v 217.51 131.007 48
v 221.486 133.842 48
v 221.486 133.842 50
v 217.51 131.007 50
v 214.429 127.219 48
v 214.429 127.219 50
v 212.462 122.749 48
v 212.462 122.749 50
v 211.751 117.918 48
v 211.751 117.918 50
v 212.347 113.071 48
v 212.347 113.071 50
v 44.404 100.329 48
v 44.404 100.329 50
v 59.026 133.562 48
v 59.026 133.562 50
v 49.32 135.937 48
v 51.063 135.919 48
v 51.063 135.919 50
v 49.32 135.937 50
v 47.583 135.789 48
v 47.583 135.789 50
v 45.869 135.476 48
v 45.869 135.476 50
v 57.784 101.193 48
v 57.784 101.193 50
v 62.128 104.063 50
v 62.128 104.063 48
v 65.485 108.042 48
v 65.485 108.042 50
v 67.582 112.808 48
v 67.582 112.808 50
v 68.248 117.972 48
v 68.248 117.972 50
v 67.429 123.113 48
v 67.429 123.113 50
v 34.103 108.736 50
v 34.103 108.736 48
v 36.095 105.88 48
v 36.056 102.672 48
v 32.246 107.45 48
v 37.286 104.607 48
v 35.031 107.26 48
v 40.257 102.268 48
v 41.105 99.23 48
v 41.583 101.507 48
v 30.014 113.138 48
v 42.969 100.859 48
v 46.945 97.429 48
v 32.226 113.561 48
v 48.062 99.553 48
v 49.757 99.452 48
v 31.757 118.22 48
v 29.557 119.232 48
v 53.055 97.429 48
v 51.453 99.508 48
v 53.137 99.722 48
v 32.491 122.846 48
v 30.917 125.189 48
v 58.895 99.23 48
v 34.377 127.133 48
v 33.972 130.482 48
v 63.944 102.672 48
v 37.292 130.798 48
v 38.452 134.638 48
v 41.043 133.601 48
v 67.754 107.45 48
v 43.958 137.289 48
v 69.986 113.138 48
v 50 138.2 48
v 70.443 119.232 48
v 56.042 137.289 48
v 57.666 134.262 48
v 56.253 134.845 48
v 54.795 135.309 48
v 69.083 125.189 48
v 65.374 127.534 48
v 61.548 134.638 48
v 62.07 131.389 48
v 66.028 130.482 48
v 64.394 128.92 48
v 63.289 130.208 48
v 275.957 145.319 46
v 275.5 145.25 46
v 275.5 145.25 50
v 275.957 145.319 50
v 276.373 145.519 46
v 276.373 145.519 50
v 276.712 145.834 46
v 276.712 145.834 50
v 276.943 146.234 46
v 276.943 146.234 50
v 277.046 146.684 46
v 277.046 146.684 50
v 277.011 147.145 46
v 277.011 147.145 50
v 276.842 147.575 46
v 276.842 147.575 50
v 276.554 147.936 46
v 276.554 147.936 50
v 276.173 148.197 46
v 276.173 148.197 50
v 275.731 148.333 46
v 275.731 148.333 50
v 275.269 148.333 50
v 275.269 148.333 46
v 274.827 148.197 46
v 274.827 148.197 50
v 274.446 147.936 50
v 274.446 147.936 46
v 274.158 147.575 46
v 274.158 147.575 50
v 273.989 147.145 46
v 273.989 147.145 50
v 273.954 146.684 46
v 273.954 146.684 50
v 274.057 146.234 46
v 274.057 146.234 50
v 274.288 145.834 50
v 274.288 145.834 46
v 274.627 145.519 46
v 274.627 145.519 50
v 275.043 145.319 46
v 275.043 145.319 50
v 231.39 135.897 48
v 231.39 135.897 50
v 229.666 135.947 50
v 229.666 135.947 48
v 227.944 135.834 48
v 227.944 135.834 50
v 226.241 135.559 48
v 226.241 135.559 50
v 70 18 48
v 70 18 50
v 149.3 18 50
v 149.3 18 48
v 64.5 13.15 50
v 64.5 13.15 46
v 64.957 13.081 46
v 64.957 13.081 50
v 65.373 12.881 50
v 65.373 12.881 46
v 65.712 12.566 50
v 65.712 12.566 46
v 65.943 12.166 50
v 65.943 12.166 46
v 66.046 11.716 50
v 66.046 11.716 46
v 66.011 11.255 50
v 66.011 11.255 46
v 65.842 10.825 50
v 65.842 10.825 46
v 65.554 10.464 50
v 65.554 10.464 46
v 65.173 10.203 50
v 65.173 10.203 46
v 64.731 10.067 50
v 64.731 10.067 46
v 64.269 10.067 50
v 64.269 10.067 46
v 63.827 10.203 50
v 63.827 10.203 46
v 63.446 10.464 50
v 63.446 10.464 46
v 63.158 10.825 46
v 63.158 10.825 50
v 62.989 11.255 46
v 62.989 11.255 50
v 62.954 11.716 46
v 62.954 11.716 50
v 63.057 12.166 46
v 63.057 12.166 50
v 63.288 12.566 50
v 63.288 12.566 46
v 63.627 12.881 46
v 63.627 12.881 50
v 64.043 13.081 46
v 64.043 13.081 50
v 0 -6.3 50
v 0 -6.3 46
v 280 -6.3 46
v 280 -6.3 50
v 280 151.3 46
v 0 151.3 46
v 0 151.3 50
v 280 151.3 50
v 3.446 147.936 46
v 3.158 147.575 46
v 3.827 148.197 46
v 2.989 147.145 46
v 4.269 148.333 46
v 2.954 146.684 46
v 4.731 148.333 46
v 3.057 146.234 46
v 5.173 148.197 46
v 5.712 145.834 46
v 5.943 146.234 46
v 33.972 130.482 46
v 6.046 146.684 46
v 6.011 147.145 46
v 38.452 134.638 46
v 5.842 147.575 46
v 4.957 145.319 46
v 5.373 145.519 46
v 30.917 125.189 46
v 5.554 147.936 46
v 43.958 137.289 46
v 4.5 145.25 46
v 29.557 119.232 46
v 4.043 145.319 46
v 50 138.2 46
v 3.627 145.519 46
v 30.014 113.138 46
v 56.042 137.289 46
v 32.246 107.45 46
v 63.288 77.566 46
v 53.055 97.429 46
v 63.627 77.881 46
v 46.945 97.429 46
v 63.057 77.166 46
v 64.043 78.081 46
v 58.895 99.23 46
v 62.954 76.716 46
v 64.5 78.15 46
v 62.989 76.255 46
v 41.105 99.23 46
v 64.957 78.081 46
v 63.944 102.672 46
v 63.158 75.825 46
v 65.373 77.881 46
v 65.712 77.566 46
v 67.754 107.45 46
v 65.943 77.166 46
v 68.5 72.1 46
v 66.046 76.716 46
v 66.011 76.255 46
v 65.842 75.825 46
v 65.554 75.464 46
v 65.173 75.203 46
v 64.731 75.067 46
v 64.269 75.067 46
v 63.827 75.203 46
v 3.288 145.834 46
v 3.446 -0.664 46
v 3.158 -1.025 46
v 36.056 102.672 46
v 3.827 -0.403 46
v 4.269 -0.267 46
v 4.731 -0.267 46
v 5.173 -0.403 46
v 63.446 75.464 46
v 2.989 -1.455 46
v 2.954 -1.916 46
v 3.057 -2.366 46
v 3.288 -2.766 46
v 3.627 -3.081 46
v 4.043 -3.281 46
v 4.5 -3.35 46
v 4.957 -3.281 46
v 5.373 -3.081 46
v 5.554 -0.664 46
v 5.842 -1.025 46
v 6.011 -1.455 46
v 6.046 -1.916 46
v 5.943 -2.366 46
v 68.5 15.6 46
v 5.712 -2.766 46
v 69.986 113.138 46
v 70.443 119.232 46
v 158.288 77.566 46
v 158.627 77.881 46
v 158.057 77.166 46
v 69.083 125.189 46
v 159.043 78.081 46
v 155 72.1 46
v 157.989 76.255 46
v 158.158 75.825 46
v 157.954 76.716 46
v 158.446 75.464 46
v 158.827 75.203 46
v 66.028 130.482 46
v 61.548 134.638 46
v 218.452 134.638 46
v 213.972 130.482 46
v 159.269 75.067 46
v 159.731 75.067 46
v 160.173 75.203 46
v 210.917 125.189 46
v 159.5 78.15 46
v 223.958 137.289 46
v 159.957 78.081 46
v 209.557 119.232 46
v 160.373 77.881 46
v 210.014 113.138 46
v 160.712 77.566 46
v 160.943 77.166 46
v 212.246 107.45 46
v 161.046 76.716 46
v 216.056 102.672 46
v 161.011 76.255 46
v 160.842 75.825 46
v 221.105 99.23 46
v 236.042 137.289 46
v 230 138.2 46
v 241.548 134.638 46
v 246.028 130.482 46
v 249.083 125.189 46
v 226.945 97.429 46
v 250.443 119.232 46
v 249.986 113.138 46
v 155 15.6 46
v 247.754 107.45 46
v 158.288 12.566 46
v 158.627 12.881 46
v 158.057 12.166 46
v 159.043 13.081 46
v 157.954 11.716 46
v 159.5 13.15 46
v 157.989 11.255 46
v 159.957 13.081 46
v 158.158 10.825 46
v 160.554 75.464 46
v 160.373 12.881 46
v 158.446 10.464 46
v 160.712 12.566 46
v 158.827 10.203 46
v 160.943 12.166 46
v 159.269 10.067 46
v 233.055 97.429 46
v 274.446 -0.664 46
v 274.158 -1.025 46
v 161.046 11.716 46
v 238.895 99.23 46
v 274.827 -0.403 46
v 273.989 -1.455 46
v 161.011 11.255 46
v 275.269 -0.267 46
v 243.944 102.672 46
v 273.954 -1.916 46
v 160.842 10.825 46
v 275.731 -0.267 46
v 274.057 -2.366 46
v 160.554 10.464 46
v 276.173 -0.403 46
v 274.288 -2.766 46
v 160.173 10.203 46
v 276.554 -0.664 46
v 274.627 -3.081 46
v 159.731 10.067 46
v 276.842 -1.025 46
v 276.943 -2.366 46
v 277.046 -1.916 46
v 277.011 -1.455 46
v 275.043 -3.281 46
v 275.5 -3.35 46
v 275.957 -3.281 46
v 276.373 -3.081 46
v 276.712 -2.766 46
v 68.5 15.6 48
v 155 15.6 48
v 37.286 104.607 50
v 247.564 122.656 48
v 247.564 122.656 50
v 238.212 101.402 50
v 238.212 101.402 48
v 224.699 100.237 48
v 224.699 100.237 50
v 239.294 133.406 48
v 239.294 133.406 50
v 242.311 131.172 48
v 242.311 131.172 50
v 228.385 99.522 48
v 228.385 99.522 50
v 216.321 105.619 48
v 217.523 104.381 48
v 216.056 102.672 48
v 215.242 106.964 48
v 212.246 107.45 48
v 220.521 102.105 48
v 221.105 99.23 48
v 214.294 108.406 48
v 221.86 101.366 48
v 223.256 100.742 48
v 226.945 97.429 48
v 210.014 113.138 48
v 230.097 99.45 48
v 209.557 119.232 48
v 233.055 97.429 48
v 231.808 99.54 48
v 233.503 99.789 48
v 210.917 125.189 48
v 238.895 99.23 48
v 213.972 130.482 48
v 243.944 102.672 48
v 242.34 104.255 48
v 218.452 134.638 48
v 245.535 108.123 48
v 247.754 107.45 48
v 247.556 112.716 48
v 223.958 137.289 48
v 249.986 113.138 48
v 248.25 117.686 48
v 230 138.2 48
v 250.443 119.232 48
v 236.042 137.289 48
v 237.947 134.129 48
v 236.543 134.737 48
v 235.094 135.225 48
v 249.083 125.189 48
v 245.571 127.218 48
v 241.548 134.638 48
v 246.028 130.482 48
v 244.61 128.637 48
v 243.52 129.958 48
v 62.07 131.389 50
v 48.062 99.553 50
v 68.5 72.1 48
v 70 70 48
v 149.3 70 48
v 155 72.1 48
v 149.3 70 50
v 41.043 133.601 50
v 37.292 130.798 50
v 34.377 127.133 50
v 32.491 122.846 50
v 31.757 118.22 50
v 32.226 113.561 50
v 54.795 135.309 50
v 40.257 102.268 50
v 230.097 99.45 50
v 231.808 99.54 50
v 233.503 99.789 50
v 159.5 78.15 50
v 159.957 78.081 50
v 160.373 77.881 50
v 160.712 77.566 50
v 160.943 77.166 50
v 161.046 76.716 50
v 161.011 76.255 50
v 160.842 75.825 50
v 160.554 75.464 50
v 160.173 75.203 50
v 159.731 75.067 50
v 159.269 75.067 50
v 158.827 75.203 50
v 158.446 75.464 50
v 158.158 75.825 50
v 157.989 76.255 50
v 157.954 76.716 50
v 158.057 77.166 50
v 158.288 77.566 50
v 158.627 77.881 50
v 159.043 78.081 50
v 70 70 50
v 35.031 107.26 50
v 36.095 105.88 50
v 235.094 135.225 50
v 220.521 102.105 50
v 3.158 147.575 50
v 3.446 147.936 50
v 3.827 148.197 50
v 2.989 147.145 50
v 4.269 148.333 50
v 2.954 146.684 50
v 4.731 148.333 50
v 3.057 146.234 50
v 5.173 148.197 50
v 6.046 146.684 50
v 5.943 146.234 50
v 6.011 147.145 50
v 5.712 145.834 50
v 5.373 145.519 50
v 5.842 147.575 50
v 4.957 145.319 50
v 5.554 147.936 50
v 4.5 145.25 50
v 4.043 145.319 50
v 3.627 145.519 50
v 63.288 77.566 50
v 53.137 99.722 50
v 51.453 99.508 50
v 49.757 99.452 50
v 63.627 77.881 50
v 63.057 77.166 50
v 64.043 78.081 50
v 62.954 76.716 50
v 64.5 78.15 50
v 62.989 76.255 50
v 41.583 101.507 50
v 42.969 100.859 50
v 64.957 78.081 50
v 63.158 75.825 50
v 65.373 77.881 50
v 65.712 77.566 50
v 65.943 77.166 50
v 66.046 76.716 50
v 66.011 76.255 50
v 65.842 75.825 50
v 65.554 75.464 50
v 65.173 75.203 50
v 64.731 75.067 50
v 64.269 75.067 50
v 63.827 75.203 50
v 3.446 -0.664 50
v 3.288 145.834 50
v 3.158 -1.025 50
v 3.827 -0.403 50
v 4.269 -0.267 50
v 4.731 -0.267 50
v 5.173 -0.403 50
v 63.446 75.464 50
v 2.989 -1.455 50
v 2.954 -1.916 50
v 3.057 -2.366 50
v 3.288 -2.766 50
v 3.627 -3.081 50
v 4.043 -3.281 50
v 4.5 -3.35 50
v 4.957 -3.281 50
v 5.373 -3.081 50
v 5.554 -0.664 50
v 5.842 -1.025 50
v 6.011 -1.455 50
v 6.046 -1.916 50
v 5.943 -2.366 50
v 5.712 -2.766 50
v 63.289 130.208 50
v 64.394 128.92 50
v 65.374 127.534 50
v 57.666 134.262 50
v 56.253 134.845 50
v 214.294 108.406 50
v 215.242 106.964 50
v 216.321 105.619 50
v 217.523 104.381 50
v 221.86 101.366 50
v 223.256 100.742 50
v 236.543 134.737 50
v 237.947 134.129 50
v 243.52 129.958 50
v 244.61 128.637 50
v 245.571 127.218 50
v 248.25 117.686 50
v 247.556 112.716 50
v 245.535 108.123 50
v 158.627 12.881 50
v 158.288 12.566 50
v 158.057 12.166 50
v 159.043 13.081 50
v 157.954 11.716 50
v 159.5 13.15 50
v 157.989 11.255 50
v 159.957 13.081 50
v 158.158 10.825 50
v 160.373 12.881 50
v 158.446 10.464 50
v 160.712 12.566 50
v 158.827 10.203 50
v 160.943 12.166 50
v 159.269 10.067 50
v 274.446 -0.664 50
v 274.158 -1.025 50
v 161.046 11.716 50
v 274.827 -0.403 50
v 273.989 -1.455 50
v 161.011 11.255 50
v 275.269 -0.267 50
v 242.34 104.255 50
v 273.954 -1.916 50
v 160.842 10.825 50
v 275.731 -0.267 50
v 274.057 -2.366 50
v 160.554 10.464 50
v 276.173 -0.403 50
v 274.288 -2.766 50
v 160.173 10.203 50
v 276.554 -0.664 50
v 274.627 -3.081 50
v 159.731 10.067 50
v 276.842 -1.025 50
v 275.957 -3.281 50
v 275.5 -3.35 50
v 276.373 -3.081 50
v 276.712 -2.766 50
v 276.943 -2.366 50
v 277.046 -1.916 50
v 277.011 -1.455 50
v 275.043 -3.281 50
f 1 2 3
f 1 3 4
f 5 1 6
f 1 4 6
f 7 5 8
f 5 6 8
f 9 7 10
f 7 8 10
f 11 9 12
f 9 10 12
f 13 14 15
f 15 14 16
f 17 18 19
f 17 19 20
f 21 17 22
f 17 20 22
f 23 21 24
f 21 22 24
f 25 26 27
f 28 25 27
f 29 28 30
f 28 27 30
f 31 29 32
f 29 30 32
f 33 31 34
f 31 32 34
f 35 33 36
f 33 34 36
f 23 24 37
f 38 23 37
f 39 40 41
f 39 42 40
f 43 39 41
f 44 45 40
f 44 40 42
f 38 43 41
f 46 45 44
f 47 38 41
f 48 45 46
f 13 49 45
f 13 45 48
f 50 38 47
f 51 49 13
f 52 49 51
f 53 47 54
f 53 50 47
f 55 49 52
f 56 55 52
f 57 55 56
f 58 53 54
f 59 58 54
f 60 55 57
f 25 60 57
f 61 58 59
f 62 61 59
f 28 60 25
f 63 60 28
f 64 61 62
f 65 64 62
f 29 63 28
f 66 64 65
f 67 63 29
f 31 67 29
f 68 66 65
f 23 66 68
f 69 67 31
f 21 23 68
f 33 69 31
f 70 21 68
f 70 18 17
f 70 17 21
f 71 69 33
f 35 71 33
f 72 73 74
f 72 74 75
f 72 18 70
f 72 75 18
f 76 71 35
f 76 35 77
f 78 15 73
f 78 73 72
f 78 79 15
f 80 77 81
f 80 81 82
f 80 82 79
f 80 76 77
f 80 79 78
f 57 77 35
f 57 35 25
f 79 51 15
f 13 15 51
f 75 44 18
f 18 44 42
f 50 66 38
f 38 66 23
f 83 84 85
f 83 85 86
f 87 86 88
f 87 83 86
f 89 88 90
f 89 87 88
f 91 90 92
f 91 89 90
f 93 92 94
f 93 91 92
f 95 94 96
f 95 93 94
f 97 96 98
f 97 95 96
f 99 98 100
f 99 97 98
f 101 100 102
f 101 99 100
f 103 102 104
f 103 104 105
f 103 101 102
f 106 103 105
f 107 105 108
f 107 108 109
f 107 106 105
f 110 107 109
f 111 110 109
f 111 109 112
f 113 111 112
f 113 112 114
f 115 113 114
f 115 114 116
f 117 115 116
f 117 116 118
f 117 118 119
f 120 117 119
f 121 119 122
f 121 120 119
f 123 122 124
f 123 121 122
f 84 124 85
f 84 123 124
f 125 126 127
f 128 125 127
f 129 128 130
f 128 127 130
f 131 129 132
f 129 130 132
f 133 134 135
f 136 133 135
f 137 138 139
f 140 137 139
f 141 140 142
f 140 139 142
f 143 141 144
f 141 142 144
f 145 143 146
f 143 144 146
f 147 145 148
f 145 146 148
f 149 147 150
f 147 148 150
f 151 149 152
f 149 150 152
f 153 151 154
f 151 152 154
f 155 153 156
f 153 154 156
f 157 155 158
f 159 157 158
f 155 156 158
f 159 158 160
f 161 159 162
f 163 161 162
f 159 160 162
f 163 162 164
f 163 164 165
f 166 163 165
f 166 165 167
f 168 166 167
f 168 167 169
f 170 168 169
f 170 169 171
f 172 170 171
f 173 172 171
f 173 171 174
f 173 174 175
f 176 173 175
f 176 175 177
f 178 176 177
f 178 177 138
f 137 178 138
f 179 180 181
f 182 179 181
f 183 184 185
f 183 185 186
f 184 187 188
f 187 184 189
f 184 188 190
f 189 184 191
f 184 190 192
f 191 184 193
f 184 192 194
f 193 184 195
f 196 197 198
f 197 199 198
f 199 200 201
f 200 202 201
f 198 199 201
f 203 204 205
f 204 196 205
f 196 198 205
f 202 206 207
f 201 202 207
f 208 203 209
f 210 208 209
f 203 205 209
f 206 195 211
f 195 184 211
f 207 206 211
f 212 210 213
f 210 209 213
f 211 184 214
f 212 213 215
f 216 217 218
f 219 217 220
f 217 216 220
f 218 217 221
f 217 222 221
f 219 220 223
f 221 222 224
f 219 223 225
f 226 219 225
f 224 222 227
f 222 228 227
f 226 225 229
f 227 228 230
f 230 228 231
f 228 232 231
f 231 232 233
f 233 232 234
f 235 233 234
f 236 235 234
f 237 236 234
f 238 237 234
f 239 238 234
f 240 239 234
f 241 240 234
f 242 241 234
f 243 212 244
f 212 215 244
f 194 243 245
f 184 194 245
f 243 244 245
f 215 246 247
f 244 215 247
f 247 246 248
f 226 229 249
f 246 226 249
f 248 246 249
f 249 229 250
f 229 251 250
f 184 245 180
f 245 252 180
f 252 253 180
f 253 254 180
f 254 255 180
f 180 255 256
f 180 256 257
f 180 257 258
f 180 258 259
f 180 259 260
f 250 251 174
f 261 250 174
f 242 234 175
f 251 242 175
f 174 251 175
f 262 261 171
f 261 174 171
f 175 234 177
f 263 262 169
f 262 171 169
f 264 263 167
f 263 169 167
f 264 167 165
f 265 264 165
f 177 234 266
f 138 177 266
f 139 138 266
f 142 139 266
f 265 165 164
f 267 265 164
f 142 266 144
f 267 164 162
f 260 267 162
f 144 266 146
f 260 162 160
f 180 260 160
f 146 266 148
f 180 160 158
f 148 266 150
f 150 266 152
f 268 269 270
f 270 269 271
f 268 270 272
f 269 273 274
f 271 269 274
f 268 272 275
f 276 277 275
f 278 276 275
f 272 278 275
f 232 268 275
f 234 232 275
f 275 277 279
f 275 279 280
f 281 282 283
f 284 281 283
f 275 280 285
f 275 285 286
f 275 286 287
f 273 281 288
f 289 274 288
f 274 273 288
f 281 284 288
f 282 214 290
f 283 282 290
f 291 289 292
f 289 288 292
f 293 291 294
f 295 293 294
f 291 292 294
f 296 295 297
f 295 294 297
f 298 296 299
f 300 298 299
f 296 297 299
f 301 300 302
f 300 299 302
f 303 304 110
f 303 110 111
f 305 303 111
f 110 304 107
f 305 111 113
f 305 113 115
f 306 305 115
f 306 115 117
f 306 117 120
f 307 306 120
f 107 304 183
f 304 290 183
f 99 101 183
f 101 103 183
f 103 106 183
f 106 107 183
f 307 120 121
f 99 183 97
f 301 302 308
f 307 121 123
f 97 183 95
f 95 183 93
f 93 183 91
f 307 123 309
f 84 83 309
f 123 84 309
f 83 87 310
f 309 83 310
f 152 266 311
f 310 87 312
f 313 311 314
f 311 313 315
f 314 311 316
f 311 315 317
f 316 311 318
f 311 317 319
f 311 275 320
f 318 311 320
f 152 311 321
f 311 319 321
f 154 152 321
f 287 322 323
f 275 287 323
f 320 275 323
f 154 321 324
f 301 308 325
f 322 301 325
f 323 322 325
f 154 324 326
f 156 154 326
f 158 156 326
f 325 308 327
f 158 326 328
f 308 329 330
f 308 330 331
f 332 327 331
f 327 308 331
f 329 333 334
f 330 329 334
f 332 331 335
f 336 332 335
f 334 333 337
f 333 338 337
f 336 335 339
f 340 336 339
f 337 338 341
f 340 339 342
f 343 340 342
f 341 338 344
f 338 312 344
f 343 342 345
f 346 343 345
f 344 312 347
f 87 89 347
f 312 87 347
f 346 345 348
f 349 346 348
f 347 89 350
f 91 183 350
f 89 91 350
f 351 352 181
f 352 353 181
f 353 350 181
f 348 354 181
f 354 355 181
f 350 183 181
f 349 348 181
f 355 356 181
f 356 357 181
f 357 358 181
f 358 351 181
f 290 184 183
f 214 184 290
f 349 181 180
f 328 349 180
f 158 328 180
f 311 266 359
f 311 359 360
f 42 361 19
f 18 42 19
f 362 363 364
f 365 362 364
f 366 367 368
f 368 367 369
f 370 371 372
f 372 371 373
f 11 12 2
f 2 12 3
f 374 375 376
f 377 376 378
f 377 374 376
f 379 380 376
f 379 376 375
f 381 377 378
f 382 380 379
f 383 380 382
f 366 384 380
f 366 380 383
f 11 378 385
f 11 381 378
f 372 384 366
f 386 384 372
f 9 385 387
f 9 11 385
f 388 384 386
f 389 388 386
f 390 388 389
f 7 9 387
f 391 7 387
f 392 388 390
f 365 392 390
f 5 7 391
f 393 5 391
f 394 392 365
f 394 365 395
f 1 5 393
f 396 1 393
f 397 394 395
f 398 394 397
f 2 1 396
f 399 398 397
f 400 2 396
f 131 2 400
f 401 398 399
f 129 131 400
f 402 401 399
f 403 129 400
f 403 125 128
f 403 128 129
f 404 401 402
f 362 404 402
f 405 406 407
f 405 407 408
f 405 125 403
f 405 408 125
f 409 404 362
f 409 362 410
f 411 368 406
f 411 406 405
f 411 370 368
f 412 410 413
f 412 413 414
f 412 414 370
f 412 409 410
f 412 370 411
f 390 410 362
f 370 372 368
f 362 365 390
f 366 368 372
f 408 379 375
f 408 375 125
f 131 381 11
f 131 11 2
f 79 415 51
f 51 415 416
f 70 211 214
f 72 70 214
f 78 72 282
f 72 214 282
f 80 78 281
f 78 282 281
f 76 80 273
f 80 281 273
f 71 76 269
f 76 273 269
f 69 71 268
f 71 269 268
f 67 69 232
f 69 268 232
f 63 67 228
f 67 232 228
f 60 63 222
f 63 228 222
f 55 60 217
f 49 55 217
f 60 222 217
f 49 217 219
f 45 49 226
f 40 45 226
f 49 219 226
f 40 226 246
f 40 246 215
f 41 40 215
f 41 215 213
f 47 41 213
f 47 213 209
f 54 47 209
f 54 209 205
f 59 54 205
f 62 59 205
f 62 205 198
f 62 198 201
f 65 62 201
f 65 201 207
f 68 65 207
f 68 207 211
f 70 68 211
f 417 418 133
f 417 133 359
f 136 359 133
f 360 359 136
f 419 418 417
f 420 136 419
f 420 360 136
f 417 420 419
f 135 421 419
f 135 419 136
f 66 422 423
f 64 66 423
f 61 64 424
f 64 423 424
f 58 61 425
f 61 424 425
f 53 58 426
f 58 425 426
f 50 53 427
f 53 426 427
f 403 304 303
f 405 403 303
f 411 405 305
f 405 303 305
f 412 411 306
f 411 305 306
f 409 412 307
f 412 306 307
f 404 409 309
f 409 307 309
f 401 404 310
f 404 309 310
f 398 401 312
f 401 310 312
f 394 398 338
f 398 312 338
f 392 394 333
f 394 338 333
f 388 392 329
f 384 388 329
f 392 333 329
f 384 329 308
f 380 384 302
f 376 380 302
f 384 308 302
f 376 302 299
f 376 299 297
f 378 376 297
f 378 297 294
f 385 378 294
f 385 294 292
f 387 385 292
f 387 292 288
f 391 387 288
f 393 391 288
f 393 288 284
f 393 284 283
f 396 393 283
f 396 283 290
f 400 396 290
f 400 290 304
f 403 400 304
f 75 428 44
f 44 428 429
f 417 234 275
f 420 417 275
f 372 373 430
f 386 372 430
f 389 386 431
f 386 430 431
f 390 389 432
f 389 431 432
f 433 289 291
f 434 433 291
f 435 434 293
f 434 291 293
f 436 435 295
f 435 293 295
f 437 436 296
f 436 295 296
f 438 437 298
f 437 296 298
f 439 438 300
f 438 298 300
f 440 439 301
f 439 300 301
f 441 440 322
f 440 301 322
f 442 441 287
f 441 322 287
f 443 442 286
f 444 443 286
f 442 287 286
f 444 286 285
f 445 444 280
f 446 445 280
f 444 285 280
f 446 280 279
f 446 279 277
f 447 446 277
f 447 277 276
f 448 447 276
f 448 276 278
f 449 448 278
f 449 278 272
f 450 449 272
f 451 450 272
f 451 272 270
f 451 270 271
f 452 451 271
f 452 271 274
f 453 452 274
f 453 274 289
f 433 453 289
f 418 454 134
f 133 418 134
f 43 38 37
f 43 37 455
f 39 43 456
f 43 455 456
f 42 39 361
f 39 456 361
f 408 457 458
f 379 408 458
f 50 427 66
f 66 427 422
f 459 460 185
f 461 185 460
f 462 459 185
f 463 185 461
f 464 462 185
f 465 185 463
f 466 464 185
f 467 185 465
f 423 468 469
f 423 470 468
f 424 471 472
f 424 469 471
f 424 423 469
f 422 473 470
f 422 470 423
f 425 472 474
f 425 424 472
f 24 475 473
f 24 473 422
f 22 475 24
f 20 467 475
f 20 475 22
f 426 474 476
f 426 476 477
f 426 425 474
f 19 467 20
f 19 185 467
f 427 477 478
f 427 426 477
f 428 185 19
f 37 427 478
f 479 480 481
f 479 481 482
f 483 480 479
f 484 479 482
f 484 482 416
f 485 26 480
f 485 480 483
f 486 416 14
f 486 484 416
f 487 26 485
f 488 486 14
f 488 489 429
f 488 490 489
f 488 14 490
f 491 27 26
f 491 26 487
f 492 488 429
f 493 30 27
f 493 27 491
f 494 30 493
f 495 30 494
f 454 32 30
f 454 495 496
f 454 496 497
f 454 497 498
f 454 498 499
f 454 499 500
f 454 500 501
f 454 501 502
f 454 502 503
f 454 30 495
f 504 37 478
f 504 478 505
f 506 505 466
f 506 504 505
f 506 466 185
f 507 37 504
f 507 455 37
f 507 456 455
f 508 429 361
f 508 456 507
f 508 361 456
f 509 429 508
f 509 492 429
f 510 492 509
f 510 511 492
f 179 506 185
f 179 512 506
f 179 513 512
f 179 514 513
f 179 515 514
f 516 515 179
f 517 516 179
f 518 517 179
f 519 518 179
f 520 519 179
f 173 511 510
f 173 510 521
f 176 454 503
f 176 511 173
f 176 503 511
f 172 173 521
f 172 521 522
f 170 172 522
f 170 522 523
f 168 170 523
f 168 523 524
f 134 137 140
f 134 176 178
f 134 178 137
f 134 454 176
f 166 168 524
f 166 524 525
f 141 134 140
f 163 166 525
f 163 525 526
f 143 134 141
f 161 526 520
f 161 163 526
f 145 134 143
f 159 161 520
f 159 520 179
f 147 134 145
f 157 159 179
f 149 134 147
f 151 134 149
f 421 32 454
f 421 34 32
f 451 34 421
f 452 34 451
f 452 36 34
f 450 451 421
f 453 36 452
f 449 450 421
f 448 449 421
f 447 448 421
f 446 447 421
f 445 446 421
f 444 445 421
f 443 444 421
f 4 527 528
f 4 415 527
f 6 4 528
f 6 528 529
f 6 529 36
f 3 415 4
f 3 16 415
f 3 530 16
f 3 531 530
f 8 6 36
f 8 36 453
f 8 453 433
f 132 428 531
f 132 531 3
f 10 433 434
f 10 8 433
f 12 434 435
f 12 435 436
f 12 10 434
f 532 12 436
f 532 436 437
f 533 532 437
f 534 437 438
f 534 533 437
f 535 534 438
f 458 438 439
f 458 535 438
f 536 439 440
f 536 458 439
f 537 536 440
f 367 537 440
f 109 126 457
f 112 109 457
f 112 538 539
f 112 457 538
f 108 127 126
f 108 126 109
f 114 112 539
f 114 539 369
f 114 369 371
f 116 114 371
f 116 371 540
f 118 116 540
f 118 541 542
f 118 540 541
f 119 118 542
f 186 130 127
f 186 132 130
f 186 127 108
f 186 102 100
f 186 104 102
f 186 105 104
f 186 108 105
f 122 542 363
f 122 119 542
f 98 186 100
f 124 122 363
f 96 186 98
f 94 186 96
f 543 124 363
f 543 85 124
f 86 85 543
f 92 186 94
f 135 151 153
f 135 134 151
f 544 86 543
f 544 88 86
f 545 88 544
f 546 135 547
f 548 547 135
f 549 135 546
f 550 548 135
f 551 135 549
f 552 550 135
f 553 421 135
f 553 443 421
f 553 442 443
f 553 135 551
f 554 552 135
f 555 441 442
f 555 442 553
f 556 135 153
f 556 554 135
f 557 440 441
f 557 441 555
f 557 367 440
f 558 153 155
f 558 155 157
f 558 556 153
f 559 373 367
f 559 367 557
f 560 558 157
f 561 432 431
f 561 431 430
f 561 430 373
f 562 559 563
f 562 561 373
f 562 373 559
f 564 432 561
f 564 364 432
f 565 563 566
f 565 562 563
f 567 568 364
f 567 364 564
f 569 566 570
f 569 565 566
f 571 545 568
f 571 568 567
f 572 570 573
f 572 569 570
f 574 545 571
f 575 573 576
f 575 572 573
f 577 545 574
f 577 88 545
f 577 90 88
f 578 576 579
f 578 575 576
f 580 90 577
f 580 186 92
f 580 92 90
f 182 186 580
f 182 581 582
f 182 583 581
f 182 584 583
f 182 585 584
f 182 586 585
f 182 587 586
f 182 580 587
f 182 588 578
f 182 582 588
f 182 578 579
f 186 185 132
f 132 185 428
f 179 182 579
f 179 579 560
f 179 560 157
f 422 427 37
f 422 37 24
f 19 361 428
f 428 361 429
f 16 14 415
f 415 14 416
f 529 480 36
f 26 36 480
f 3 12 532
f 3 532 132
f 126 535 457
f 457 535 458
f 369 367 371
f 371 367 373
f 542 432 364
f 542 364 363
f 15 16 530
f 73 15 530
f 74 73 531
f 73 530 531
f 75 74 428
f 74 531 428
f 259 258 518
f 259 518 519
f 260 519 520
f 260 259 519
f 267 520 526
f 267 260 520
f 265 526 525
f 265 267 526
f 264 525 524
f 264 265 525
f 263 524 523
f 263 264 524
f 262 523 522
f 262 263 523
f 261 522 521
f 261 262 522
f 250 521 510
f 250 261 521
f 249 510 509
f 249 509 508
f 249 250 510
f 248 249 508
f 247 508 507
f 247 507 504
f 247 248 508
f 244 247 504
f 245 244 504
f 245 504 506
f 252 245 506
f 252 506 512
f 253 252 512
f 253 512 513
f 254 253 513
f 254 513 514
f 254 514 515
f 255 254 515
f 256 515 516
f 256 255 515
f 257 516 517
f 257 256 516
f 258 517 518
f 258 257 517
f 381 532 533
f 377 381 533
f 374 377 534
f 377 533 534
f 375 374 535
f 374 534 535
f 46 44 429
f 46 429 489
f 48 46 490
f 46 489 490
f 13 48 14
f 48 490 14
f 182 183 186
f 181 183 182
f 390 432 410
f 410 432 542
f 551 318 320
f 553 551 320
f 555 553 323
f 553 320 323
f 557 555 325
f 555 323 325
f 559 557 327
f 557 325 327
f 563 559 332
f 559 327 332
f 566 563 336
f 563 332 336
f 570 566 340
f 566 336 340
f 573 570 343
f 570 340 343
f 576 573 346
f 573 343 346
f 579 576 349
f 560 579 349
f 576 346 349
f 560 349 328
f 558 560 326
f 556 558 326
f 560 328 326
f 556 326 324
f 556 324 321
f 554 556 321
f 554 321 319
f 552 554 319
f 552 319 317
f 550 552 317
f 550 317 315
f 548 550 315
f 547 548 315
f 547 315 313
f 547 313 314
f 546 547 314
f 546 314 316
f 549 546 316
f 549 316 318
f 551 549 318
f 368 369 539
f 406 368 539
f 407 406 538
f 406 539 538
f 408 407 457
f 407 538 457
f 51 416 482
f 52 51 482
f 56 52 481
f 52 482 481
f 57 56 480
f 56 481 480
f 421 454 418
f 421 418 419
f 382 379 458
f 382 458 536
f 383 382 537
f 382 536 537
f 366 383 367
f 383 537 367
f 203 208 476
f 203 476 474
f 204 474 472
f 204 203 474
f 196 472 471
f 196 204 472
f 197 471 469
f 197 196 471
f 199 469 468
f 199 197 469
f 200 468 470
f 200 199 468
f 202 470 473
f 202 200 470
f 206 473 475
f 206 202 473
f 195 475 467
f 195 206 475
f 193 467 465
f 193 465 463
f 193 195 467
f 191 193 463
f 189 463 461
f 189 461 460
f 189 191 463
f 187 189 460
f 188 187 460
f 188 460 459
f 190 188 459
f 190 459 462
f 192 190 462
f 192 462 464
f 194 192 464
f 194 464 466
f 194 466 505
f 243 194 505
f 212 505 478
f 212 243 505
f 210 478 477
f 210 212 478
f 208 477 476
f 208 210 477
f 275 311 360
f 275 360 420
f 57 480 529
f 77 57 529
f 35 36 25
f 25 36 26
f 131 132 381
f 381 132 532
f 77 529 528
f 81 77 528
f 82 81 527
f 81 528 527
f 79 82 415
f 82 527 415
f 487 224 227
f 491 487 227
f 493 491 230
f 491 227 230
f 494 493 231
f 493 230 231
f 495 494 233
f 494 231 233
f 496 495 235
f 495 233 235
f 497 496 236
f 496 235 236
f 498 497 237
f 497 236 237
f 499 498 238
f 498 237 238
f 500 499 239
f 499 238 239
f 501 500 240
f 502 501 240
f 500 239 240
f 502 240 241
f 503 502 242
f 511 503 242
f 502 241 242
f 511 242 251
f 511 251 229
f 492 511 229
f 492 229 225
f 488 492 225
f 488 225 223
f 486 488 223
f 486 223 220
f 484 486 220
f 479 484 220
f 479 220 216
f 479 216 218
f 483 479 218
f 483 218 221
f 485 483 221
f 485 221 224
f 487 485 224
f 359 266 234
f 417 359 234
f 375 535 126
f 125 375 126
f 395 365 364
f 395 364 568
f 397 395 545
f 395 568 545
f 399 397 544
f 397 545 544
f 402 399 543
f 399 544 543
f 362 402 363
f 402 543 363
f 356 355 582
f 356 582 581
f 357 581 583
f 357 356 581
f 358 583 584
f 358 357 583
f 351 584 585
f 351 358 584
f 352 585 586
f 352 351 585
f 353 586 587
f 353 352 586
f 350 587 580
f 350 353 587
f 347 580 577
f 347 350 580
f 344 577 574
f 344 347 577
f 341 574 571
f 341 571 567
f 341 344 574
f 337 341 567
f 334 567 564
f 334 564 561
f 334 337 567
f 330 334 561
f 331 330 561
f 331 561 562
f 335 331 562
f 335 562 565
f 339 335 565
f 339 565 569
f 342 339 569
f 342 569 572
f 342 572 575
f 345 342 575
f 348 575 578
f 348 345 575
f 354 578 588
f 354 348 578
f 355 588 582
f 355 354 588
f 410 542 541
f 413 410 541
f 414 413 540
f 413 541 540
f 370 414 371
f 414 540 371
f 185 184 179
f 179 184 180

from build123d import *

# Parameters (mm, degrees)
SKETCH015_W     = 157.6
SKETCH015_H     = 280
SKETCH015_R     = 1.55
PAD007_DEPTH    = 4
SKETCH016_R     = 18.25
SKETCH016_W     = 52
SKETCH016_H     = 79.3
POCKET008_DEPTH = 10
SKETCH017_R     = 20.5
SKETCH017_W     = 56.5
SKETCH017_H     = 86.5
POCKET009_DEPTH = 2
PAD008_DEPTH    = 2
SKETCH019_R     = 1.55
POCKET010_DEPTH = 9


with BuildPart() as part:
    # Sketch015 (on ShapeBinder) → Pad007 (new body)
    with BuildSketch(Plane(origin=(0, 0, 46), x_dir=(0, -1, 0), z_dir=(0, 0, 1))):
        with Locations((-72.5, 140)):
            Rectangle(SKETCH015_W, SKETCH015_H)
        with Locations((-146.8, 275.5)):
            Circle(SKETCH015_R, mode=Mode.SUBTRACT)
        with Locations((1.8, 275.5)):
            Circle(SKETCH015_R, mode=Mode.SUBTRACT)
        with Locations((-146.8, 4.5)):
            Circle(SKETCH015_R, mode=Mode.SUBTRACT)
        with Locations((1.8, 4.5)):
            Circle(SKETCH015_R, mode=Mode.SUBTRACT)
    extrude(amount=PAD007_DEPTH)

    # Sketch016 (on Face10 of Pad007) → Pocket008 (cut)
    with BuildSketch(Plane(origin=(0, 0, 50), x_dir=(0, -1, 0), z_dir=(0, 0, 1))):
        with Locations((-117.7, 50)):
            Circle(SKETCH016_R)
        with Locations((-117.7, 230)):
            Circle(SKETCH016_R)
        with Locations((-44, 109.65)):
            Rectangle(SKETCH016_W, SKETCH016_H)
    extrude(amount=-POCKET008_DEPTH, mode=Mode.SUBTRACT)

    # Sketch017 (on Face4 of Pocket008) → Pocket009 (cut)
    with BuildSketch(Plane.YX.offset(-46)):
        with Locations((117.7, 230)):
            Circle(SKETCH017_R)
        with Locations((117.7, 50)):
            Circle(SKETCH017_R)
        with Locations((43.85, 111.75)):
            Rectangle(SKETCH017_W, SKETCH017_H)
    extrude(amount=-POCKET009_DEPTH, mode=Mode.SUBTRACT)

    # Sketch018 (on Face5 of Pocket009) → Pad008 (join)
    with BuildSketch(Plane(origin=(0, 0, 50), x_dir=(0, -1, 0), z_dir=(0, 0, 1))):
        Polygon((-142.58252, 252.331589), (-142.58252, 256.331589), (-92.58252, 234.331589), (-92.58252, 230.331589), align=None)
        Polygon((-142.58252, 243.331589), (-142.58252, 247.331589), (-92.58252, 225.331589), (-92.58252, 221.331589), align=None)
        Polygon((-142.58252, 234.331589), (-142.58252, 238.331589), (-92.58252, 216.331589), (-92.58252, 212.331589), align=None)
        Polygon((-142.58252, 225.331589), (-142.58252, 229.331589), (-92.58252, 207.331589), (-92.58252, 203.331589), align=None)
        Polygon((-142.313179, 71.876823), (-142.313179, 75.876823), (-92.313179, 53.876823), (-92.313179, 49.876823), align=None)
        Polygon((-142.313179, 62.876823), (-142.313179, 66.876823), (-92.313179, 44.876823), (-92.313179, 40.876823), align=None)
        Polygon((-142.313179, 53.876823), (-142.313179, 57.876823), (-92.313179, 35.876823), (-92.313179, 31.876823), align=None)
        Polygon((-142.313179, 44.876823), (-142.313179, 48.876823), (-92.313179, 26.876823), (-92.313179, 22.876823), align=None)
    extrude(amount=-PAD008_DEPTH)

    # Sketch019 (on Face4 of Pad008) → Pocket010 (cut)
    with BuildSketch(Plane.YX.offset(-46)):
        with Locations((11.6, 159.5)):
            Circle(SKETCH019_R)
        with Locations((76.6, 159.5)):
            Circle(SKETCH019_R)
        with Locations((76.6, 64.5)):
            Circle(SKETCH019_R)
        with Locations((11.6, 64.5)):
            Circle(SKETCH019_R)
    extrude(amount=-POCKET010_DEPTH, mode=Mode.SUBTRACT)


solid = part.part
